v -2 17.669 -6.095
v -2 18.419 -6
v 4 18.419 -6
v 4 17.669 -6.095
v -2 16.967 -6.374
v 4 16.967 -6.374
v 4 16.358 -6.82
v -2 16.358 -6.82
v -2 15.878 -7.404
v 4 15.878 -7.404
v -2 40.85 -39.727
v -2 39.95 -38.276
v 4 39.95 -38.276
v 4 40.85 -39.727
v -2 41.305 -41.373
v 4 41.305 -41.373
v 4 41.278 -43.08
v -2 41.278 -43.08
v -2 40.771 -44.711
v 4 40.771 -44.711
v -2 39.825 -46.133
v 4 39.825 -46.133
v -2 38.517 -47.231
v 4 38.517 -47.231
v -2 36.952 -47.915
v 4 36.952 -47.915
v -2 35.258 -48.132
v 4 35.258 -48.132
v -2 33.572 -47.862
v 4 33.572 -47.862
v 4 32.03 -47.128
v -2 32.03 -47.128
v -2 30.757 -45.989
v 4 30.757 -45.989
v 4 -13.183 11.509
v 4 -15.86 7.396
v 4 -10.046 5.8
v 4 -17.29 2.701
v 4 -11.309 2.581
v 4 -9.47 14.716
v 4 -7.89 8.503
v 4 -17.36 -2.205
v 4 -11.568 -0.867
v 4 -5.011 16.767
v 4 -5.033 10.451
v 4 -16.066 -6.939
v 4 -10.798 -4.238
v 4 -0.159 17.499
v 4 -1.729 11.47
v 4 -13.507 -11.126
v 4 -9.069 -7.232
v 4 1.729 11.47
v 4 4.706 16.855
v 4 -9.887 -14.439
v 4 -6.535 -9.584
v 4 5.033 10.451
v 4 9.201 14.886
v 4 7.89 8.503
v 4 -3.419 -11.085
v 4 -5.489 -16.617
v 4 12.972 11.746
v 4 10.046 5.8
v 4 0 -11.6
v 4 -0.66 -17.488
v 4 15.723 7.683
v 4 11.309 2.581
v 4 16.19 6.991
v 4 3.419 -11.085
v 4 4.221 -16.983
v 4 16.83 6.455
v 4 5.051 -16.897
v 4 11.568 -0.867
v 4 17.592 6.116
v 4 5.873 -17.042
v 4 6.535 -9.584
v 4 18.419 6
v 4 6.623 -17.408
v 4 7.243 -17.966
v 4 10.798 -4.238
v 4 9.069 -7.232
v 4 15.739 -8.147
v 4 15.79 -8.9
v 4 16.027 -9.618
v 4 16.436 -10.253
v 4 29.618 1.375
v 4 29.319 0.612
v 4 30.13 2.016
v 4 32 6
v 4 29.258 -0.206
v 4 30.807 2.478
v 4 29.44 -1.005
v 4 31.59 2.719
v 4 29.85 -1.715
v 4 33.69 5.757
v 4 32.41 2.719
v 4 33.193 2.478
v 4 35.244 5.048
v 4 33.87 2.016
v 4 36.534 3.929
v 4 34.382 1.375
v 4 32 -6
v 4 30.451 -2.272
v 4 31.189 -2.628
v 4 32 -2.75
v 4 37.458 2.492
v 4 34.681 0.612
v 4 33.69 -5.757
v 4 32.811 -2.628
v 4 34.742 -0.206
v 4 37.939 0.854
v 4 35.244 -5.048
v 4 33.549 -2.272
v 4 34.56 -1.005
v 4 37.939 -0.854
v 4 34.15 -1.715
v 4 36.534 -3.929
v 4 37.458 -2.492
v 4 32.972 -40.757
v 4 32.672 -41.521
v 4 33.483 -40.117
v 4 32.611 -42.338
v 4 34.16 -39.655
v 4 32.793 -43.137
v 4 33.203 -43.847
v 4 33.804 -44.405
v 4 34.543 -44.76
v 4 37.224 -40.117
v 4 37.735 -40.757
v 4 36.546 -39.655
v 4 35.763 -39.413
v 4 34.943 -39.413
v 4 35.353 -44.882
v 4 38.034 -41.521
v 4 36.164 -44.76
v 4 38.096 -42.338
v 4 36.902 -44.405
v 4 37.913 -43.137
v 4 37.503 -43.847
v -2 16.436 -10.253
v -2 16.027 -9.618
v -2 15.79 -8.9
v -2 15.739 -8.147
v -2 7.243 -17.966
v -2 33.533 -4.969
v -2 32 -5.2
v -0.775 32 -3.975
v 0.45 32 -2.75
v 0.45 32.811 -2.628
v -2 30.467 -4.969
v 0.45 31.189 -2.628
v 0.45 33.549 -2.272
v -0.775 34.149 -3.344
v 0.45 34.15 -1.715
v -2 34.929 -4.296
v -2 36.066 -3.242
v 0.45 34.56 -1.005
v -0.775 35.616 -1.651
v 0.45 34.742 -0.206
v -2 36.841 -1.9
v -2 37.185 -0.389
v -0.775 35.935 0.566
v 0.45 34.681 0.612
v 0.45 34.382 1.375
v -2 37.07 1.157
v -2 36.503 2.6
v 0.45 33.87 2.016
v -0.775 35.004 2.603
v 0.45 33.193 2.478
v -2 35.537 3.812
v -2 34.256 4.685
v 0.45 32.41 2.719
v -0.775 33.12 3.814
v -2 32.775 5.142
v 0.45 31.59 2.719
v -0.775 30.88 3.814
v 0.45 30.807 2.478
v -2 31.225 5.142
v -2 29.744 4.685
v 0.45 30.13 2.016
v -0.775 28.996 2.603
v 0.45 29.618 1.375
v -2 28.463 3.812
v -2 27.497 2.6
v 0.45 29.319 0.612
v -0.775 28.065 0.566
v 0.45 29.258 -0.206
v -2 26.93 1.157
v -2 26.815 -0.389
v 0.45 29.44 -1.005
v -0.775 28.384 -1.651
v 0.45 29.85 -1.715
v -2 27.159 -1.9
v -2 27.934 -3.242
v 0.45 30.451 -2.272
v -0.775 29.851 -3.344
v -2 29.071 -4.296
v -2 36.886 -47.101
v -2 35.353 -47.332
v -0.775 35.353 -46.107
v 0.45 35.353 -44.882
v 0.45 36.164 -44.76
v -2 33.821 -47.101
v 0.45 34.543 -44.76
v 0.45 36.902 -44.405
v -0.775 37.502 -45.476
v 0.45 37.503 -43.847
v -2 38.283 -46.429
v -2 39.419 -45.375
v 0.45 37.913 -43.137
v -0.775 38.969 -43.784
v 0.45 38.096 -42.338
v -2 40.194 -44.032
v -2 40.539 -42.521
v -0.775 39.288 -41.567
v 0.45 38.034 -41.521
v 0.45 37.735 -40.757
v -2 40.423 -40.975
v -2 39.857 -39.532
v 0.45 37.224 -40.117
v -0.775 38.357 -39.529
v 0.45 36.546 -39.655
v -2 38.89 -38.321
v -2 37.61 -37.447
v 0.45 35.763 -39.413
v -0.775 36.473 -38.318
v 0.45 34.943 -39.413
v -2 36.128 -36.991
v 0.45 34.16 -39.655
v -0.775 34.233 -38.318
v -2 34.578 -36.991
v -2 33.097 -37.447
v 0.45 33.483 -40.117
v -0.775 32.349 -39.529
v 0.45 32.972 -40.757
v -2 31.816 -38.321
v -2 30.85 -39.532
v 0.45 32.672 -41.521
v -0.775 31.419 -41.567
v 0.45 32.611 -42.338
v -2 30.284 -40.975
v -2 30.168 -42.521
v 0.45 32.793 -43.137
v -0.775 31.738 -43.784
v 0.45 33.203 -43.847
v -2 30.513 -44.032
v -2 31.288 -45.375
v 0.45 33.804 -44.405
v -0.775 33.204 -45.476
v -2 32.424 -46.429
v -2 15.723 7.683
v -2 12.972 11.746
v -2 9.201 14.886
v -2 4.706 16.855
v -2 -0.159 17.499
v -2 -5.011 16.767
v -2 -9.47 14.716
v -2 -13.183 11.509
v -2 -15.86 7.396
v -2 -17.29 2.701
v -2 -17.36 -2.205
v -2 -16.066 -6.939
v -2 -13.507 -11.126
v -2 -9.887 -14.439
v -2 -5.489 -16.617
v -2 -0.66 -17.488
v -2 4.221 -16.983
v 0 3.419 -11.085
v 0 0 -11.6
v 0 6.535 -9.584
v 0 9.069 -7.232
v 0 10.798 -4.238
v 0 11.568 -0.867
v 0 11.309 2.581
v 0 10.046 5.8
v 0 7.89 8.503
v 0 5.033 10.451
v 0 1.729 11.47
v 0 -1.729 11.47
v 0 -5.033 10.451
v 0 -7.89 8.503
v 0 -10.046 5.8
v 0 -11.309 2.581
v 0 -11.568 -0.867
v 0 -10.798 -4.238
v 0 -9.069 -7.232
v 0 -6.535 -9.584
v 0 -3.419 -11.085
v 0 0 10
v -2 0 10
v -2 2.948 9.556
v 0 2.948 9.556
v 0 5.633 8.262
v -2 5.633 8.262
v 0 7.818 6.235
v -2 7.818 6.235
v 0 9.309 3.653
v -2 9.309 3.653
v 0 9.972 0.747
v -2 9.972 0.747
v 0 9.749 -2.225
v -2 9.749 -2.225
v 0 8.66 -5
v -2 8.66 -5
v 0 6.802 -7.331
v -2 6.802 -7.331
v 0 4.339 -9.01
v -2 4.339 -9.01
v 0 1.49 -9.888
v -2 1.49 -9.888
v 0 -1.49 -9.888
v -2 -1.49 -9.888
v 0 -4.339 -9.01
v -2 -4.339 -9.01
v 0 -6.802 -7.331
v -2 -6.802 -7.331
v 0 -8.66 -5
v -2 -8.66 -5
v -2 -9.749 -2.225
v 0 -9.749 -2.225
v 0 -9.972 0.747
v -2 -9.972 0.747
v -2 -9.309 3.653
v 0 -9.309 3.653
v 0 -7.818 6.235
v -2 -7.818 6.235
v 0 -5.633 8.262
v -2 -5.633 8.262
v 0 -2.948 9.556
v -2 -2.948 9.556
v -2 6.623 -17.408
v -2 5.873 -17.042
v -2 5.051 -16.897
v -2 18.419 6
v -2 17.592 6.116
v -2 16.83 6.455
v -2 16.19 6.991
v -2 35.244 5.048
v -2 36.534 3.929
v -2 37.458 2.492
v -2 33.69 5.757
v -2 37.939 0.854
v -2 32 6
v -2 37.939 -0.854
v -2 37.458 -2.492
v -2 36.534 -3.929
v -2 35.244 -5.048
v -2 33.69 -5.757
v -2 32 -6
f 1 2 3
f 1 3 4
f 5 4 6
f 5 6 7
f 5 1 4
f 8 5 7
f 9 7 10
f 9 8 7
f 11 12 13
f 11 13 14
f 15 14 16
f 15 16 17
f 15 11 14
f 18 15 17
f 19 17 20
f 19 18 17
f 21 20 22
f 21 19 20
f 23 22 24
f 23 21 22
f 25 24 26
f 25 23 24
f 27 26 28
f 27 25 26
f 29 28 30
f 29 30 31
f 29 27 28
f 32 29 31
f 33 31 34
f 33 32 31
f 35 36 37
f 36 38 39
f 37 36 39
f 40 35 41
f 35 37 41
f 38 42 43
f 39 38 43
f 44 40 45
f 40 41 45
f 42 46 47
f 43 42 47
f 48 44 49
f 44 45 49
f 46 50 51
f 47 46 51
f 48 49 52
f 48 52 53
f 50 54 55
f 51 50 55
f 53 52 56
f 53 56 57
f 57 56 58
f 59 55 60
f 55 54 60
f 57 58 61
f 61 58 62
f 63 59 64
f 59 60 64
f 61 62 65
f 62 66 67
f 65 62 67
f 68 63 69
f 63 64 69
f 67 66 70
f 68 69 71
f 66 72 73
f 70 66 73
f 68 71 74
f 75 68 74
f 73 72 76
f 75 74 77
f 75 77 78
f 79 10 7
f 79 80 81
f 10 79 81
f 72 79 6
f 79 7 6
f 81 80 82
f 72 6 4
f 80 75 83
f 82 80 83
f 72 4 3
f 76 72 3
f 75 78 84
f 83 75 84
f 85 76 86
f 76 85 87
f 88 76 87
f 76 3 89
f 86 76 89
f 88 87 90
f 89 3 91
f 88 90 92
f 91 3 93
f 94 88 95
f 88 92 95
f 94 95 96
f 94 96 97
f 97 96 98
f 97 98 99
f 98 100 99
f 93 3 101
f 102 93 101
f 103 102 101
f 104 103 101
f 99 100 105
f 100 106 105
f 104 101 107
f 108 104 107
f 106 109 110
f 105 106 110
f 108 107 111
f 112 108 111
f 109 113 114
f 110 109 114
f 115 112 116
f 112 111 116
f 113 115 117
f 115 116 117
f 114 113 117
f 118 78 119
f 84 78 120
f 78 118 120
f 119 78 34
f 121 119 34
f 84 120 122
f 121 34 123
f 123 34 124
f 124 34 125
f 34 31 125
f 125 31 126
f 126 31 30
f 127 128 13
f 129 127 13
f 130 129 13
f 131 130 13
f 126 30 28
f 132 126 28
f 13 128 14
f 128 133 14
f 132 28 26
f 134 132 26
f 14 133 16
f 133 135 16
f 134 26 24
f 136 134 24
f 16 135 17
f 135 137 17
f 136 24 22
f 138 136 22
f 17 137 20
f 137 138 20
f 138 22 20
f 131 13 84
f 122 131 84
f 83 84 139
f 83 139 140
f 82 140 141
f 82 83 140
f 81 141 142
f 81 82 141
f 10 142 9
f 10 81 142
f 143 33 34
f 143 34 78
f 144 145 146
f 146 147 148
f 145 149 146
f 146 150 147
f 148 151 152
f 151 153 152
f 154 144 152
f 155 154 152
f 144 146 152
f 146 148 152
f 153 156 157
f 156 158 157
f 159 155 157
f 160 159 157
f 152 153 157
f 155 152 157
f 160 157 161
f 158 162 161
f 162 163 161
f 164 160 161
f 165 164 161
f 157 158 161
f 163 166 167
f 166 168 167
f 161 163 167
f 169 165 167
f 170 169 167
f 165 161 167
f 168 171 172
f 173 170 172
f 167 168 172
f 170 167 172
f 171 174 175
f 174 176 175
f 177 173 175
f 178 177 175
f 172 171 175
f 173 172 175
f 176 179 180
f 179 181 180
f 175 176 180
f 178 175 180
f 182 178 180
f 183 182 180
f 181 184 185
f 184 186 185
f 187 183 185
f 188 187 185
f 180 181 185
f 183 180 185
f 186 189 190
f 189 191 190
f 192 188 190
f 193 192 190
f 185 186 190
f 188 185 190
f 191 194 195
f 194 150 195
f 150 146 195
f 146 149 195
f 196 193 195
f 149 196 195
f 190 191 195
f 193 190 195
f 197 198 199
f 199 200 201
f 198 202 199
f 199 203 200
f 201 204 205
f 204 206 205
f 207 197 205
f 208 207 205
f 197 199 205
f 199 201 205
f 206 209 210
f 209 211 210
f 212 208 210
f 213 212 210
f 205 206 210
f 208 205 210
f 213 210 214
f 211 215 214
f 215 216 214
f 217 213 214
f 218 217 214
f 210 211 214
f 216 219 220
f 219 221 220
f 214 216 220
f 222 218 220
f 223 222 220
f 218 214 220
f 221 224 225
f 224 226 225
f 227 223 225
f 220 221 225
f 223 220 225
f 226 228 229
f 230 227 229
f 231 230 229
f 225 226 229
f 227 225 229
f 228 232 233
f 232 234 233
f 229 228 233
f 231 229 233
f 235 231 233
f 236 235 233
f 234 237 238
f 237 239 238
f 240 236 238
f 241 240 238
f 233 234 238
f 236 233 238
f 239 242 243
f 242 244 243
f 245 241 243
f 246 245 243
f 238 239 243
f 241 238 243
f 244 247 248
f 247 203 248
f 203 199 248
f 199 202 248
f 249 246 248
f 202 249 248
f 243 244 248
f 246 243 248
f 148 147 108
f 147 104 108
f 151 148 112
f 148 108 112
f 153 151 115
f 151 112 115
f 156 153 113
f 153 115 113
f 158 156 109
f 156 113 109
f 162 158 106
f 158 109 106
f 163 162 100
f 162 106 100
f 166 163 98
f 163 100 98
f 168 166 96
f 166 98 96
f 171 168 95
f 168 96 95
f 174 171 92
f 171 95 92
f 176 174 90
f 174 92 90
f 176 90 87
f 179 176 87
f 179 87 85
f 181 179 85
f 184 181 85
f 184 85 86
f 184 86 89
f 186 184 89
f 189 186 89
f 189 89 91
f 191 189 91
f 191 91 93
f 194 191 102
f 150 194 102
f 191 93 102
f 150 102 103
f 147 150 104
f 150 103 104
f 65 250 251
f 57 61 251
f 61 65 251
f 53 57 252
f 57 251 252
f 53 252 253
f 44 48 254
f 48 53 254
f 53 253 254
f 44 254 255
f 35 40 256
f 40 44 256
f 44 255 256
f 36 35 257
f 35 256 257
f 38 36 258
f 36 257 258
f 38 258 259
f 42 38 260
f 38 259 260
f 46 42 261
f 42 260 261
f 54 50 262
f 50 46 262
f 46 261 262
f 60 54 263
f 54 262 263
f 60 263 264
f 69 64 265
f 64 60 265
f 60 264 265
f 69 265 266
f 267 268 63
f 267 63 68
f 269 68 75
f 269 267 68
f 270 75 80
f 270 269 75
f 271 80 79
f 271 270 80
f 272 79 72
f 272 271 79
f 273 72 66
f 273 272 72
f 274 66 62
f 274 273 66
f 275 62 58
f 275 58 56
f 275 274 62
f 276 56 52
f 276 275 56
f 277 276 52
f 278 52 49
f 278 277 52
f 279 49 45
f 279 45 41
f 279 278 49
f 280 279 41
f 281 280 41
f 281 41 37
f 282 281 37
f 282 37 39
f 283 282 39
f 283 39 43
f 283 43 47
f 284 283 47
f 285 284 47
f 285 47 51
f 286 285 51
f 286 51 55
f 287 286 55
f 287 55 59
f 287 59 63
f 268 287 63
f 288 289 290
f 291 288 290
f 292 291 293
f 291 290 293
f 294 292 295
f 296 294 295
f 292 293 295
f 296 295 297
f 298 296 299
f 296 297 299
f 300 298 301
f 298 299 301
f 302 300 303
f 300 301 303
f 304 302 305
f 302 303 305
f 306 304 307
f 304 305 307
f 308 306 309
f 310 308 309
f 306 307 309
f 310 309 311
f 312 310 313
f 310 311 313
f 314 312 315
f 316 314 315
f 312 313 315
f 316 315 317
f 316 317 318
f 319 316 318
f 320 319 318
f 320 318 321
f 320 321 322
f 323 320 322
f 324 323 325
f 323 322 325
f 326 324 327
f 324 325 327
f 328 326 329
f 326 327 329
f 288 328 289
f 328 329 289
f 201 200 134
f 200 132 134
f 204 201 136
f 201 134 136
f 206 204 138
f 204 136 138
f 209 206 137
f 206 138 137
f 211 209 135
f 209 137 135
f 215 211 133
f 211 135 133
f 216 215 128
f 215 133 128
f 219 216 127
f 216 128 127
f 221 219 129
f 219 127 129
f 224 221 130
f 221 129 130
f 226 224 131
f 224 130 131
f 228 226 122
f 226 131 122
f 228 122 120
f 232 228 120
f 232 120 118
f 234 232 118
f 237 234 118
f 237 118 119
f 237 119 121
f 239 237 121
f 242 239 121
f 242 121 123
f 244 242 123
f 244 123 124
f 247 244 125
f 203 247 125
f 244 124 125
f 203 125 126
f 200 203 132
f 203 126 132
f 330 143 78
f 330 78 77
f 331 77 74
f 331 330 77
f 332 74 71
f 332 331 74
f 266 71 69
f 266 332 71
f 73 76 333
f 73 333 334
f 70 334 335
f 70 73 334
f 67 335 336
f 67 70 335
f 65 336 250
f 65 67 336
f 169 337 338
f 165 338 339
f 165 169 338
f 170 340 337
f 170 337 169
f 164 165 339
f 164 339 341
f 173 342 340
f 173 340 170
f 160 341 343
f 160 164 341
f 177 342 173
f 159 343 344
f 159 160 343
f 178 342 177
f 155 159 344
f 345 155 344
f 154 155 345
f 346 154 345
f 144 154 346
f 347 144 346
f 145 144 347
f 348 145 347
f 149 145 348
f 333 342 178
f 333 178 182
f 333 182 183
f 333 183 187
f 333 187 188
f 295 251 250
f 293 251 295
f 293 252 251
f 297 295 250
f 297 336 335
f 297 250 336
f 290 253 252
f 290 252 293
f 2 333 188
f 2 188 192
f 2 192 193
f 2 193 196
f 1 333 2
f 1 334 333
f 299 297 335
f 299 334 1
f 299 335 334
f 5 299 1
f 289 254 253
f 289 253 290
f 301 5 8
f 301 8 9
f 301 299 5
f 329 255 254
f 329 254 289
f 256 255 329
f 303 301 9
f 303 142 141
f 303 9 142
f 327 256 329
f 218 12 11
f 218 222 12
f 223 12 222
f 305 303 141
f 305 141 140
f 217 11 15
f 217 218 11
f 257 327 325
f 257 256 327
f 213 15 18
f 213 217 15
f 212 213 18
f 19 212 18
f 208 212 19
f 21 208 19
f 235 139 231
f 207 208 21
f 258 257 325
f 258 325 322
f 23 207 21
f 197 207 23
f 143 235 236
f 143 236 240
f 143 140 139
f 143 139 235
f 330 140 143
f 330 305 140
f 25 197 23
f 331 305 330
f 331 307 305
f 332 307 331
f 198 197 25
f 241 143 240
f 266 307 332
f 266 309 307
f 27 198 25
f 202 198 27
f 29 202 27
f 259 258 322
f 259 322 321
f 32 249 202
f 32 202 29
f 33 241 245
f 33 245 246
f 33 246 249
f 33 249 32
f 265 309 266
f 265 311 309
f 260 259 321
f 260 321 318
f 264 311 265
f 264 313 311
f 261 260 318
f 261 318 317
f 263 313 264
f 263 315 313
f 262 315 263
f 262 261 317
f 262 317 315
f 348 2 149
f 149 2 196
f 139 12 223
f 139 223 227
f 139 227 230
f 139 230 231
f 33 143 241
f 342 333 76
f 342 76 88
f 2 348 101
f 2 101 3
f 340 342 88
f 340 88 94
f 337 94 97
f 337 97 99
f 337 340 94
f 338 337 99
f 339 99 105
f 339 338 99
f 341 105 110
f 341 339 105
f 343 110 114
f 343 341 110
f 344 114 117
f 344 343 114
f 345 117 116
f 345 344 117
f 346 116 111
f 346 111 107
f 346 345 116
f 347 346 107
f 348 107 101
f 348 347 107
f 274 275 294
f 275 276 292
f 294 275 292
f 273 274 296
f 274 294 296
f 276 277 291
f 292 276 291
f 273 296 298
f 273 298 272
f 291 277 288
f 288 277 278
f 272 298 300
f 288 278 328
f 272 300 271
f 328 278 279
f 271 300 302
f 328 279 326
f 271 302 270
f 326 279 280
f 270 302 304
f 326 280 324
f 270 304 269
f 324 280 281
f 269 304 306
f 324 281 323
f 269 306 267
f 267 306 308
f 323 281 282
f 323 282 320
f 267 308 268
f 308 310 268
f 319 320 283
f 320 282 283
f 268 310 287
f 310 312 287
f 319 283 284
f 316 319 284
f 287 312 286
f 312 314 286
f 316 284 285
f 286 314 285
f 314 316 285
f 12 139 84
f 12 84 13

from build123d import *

# Parameters (mm, degrees)
BOSS_EXTRUDE1_DEPTH                                 = 4
BOSS_EXTRUDE1_DEPTH_BACK                            = 2
SKETCH1_R                                           = 17.5
SKETCH1_R_2                                         = 11.6
BOSS_EXTRUDE2_DEPTH                                 = 6
CSK_FOR_M5_COUNTERSUNK_FLAT_HEAD_SCREW2_D           = 5.5
CSK_FOR_M5_COUNTERSUNK_FLAT_HEAD_SCREW2_CSINK_D     = 10.4
CSK_FOR_M5_COUNTERSUNK_FLAT_HEAD_SCREW2_CSINK_ANGLE = 90
FILLET1_R                                           = 3
SKETCH5_R                                           = 11.6
SKETCH5_R_2                                         = 10
BOSS_EXTRUDE3_DEPTH                                 = 2


with BuildPart() as part:
    # Sketch1 → Boss-Extrude1 (new, two sides: drawn at the far end of the back side and taken through both)
    with BuildSketch(Plane(origin=(0, 0, 0), x_dir=(0, 0, -1), z_dir=(1, 0, 0)).offset(-BOSS_EXTRUDE1_DEPTH_BACK)):
        Circle(SKETCH1_R)
        Circle(SKETCH1_R_2, mode=Mode.SUBTRACT)
    extrude(amount=BOSS_EXTRUDE1_DEPTH + BOSS_EXTRUDE1_DEPTH_BACK)

    # Sketch2 → Boss-Extrude2 (add)
    with BuildSketch(Plane.ZY.offset(2)):
        with BuildLine():
            Line((-8.736495138, 15.163233584), (-38.275718713, 39.949585191))
            ThreePointArc((-38.275718713, 39.949585191), (-46.72871103, 39.210044191), (-45.98917003, 30.757051874))
            Line((-45.98917003, 30.757051874), (-16.449946454, 5.970700266))
            ThreePointArc((-16.449946454, 5.970700266), (-15.159340579, 8.743248436), (-13.405777755, 11.24878317))
            ThreePointArc((-13.405777755, 11.24878317), (-11.242810713, 13.410786975), (-8.736495138, 15.163233584))
        make_face()
        with BuildLine():
            Line((-6, 32), (-6, 16.439282223))
            ThreePointArc((-6, 16.439282223), (-3.046519416, 17.232780375), (0, 17.5))
            ThreePointArc((0, 17.5), (3.046519416, 17.232780375), (6, 16.439282223))
            Line((6, 16.439282223), (6, 32))
            ThreePointArc((6, 32), (0, 38), (-6, 32))
        make_face()
    extrude(amount=-BOSS_EXTRUDE2_DEPTH)

    # CSK for M5 Countersunk Flat Head Screw2 (through all)
    with Locations(Plane.ZY.offset(2)):
        with Locations((0, 32), (-42.132444372, 35.353318533)):
            CounterSinkHole(CSK_FOR_M5_COUNTERSUNK_FLAT_HEAD_SCREW2_D / 2, CSK_FOR_M5_COUNTERSUNK_FLAT_HEAD_SCREW2_CSINK_D / 2, counter_sink_angle=CSK_FOR_M5_COUNTERSUNK_FLAT_HEAD_SCREW2_CSINK_ANGLE)

    # Fillet1
    # the kernel refuses this fillet: 3 mm, written as the material it adds along each edge
    with BuildSketch(Plane(origin=(-2, 5.970700266, -16.449946454), x_dir=(0, -0.9565409410444833, -0.2915980591597522), z_dir=(1, 0, 0)), Plane(origin=(4, 15.163233584, -8.736495138), x_dir=(0, 0.45326962070001187, 0.8913734632299009), z_dir=(-1, 0, 0)), Plane(origin=(-2, 16.439282223, -6), x_dir=(0, -0.3914755922176966, -0.9201884919394524), z_dir=(1, 0, 0)), Plane(origin=(4, 16.439282223, 6), x_dir=(0, -0.39147559221769407, 0.9201884919394534), z_dir=(-1, 0, 0))) as fillet1_piece_1:
        with BuildLine():
            CenterArc((1.985655892, 2.995901464), FILLET1_R, 203.046346261, 63.958350044)
            Line((-0.774909584, 1.821474687), (0, 0))
            ThreePointArc((0, 0), (0.914446792, 0.02390813), (1.828893584, 0))
        make_face()
    extrude(amount=6)

    # Sketch5 → Boss-Extrude3 (add)
    with BuildSketch(Plane.ZY.offset(2)):
        with Locations(Location((0, 0, 0), (0, 0, 180))):
            Circle(SKETCH5_R)
        Circle(SKETCH5_R_2, mode=Mode.SUBTRACT)
    extrude(amount=-BOSS_EXTRUDE3_DEPTH)


solid = part.part
